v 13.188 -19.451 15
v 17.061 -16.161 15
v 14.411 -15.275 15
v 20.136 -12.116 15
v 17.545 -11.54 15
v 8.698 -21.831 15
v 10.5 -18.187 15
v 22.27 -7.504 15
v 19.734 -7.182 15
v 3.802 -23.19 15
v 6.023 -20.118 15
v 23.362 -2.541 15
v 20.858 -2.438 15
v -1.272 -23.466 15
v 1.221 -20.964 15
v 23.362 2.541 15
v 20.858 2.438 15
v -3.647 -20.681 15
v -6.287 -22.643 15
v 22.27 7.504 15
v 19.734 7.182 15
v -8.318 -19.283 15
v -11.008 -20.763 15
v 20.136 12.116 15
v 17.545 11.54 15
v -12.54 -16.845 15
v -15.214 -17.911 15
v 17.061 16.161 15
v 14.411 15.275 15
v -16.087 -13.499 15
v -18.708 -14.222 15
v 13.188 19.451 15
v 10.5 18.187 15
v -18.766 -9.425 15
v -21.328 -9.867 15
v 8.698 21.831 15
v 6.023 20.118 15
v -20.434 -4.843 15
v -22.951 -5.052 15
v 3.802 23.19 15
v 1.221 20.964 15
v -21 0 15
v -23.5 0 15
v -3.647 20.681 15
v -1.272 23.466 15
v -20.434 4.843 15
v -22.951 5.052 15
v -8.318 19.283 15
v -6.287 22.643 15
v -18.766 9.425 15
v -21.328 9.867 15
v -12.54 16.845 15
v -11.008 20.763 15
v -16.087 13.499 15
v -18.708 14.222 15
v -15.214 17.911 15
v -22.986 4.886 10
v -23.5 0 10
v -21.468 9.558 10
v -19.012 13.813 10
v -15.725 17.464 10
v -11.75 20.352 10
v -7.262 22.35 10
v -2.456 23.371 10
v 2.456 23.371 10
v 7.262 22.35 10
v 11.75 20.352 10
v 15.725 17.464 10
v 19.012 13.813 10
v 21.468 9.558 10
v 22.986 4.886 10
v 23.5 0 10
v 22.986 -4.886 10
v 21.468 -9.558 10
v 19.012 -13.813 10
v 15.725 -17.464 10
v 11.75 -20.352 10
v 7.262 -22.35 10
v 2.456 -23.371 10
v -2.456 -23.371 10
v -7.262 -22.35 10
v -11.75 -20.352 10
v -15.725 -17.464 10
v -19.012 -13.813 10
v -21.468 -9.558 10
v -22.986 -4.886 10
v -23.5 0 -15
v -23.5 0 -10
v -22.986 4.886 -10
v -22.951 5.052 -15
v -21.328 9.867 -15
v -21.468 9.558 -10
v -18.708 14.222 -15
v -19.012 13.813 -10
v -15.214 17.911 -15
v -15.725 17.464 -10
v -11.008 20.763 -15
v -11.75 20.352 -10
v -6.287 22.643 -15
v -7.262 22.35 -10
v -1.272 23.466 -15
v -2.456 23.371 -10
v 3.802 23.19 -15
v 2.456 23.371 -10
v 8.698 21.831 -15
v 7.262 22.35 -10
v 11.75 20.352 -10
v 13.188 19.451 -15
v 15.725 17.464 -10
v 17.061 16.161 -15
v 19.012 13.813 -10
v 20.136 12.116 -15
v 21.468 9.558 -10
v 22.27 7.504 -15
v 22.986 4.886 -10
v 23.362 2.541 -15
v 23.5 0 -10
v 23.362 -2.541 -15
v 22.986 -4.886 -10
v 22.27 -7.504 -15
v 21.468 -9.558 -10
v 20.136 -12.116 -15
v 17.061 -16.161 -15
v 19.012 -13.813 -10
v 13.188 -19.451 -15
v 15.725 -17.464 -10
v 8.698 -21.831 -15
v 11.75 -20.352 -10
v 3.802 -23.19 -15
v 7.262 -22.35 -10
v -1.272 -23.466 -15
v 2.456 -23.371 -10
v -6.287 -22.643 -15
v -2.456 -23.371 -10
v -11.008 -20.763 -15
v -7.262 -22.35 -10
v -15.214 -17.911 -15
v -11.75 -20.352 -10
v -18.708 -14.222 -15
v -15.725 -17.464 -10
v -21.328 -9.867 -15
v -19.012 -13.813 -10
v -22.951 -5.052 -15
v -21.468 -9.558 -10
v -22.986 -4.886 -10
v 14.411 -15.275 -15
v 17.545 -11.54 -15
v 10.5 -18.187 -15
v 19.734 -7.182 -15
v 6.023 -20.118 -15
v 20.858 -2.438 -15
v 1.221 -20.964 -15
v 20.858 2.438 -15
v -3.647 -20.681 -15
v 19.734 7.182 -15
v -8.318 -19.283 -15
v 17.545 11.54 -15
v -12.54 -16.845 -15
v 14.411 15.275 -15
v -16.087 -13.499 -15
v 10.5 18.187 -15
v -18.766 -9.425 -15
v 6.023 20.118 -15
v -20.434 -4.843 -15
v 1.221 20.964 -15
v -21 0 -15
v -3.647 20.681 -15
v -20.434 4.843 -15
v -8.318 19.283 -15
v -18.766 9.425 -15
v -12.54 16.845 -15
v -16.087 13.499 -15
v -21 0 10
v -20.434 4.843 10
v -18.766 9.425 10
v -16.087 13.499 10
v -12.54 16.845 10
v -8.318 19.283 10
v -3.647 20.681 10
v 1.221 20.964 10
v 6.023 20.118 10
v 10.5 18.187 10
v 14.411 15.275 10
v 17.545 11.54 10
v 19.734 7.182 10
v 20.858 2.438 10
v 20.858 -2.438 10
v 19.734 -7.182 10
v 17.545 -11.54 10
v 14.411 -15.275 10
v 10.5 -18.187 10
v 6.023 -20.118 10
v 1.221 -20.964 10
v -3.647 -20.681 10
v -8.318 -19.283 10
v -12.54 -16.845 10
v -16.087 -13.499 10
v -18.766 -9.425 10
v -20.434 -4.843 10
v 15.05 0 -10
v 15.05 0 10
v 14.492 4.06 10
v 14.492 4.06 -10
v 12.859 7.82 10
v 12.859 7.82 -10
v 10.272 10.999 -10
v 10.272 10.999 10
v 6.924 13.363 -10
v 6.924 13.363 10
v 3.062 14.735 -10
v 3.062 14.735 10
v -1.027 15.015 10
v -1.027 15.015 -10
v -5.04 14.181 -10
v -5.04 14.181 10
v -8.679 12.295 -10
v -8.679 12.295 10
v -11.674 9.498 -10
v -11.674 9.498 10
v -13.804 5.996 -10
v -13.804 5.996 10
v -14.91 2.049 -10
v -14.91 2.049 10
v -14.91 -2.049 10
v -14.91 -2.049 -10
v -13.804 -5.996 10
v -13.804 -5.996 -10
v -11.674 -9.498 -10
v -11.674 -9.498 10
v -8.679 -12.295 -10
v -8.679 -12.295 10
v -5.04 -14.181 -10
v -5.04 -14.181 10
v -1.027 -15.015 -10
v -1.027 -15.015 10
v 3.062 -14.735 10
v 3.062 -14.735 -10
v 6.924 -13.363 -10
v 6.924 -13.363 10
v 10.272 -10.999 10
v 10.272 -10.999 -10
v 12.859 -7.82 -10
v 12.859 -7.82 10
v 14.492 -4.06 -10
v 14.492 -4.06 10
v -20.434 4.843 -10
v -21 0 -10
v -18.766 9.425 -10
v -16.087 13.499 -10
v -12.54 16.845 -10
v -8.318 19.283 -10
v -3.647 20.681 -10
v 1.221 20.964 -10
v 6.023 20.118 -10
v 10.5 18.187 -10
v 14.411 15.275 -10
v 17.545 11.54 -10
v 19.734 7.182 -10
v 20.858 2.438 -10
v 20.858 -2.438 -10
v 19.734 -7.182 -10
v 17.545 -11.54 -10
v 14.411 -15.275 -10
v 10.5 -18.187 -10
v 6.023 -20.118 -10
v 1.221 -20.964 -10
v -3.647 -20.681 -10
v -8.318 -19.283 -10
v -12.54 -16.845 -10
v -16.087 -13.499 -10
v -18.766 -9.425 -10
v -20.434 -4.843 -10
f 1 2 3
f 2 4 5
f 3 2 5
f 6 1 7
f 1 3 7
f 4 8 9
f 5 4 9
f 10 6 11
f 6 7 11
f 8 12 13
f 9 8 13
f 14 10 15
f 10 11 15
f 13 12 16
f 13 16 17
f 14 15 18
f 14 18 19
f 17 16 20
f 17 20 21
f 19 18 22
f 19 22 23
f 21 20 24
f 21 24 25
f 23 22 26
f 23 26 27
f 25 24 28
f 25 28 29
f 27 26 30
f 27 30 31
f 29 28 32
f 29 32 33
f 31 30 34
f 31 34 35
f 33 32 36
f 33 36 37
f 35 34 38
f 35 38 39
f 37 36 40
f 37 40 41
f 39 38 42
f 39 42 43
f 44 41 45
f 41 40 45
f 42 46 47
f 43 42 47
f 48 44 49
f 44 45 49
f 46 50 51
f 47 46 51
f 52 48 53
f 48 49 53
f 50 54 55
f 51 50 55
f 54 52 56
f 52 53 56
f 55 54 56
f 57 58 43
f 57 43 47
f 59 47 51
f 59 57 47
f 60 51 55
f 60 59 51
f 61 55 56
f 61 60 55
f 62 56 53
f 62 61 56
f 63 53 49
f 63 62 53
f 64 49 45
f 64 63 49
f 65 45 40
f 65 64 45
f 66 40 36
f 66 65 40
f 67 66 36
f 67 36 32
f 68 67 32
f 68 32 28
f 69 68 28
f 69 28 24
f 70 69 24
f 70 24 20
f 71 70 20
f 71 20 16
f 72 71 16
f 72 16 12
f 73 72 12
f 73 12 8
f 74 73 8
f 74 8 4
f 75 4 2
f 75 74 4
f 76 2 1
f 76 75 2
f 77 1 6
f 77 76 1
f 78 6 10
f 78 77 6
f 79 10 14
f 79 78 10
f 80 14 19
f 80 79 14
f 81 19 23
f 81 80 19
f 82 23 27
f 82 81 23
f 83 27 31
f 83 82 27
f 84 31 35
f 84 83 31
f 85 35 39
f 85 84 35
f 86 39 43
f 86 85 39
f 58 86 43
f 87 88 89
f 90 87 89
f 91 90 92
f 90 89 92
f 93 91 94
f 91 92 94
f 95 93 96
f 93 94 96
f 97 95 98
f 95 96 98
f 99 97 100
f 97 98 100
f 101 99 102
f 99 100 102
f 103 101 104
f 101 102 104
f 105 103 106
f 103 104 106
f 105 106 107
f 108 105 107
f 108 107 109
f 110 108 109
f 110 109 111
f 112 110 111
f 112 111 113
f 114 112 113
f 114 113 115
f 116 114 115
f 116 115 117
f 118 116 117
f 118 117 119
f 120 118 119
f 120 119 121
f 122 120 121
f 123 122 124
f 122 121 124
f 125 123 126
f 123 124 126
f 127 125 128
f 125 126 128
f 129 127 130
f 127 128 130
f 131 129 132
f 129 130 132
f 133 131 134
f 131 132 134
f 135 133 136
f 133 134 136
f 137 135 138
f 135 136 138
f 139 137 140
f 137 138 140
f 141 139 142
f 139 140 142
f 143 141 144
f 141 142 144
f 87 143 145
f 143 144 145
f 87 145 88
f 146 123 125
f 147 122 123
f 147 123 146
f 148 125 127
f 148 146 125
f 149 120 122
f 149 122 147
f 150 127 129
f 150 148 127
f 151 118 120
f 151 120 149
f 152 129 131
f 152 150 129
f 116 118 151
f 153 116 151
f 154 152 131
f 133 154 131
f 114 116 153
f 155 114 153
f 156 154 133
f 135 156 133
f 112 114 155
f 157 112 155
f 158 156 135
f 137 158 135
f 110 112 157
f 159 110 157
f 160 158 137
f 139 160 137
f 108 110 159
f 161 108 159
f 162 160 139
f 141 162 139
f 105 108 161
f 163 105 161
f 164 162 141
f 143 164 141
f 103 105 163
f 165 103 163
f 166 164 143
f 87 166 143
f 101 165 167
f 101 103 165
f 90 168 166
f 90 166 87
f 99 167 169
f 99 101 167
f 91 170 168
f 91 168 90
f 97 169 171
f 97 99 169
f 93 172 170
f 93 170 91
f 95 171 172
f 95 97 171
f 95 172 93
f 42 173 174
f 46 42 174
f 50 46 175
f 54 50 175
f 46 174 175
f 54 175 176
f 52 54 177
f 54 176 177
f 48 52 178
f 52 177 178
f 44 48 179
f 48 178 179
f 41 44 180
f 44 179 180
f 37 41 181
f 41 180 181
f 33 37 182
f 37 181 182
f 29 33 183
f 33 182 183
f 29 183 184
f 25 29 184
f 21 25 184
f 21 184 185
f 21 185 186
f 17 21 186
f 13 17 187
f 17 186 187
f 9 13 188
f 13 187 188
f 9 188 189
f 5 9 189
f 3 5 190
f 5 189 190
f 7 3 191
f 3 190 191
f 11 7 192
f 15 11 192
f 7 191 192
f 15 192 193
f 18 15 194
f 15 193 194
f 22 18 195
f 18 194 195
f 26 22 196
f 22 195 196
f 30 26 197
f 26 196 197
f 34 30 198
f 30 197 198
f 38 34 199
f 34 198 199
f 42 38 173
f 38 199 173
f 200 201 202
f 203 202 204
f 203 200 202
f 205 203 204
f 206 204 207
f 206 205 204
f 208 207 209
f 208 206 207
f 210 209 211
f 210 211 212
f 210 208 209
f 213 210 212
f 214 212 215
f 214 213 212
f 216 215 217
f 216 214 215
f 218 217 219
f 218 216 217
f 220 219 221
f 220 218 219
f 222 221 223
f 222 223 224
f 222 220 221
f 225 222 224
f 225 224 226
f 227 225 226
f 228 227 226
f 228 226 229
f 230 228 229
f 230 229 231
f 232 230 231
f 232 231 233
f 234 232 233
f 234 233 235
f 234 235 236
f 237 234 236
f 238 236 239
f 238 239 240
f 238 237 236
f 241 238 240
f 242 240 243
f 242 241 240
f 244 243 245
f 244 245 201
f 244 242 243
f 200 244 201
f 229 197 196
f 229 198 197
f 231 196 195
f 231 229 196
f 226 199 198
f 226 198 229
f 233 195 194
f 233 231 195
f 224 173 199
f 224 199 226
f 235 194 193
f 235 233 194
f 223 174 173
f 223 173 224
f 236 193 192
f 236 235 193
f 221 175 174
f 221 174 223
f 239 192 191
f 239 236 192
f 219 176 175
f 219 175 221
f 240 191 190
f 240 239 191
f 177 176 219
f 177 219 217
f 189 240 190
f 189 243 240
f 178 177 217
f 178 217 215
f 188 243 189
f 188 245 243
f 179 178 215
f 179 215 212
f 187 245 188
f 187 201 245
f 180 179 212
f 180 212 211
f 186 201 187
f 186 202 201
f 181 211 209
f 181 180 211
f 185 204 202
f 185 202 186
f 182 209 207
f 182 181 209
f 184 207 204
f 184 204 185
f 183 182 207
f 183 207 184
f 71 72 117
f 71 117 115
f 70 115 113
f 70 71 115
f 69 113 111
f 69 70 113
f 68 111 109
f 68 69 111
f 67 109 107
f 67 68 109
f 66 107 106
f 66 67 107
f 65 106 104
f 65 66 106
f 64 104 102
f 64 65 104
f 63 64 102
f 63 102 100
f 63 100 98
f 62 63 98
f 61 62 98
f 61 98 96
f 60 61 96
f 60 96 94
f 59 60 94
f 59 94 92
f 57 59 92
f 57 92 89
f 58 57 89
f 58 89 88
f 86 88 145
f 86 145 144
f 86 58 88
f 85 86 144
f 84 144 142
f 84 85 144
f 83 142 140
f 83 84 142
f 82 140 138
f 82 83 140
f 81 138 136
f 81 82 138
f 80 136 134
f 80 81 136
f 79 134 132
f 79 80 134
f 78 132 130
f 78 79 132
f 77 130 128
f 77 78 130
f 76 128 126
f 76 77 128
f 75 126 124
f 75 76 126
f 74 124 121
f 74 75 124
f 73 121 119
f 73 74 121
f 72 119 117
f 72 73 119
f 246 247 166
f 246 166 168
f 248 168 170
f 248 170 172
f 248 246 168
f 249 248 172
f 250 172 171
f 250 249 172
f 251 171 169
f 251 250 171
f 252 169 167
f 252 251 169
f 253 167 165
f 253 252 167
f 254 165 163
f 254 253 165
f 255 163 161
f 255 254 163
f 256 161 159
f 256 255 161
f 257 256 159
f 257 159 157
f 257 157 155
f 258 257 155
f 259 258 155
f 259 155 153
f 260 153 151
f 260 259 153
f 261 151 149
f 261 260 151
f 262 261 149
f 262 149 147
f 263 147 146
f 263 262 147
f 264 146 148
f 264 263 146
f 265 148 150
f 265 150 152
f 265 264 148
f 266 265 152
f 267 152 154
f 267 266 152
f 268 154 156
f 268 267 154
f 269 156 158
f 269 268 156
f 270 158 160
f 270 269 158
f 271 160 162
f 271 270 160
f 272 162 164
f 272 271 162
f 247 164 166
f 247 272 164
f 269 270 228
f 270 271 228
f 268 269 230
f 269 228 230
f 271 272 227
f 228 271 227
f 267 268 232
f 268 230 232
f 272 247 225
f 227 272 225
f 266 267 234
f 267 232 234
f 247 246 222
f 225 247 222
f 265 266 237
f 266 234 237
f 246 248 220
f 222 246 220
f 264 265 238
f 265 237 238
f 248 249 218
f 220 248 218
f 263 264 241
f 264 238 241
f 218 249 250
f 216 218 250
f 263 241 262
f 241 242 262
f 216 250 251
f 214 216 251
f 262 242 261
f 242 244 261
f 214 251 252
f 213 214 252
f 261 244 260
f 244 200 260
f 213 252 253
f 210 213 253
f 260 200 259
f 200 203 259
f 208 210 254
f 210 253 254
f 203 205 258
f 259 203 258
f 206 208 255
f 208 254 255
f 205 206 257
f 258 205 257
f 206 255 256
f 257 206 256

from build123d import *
from build123d.topology import SkipClean

# Parameters (mm, degrees)
SKETCH1_R           = 23.5
SKETCH1_R_2         = 15.05
BOSS_EXTRUDE1_DEPTH = 10
SKETCH2_R           = 23.5
SKETCH2_R_2         = 21
BOSS_EXTRUDE2_DEPTH = 5


with BuildPart() as part:
    # Sketch1 → Boss-Extrude1 (new, symmetric)
    with BuildSketch(Plane.XY):
        Circle(SKETCH1_R)
        Circle(SKETCH1_R_2, mode=Mode.SUBTRACT)
    extrude(amount=BOSS_EXTRUDE1_DEPTH, both=True)

    # Sketch2 → Boss-Extrude2 (add)
    with BuildSketch(Plane(origin=(0, 0, -10), x_dir=(-1, 0, 0), z_dir=(0, 0, -1))):
        Circle(SKETCH2_R)
        Circle(SKETCH2_R_2, mode=Mode.SUBTRACT)
    boss_extrude2 = extrude(amount=BOSS_EXTRUDE2_DEPTH)

    # Mirror1: Boss-Extrude2 across plane
    with SkipClean():  # the faces are left unmerged after this step: merging them gives an invalid solid
        add(boss_extrude2.mirror(Plane.XY))


solid = part.part
